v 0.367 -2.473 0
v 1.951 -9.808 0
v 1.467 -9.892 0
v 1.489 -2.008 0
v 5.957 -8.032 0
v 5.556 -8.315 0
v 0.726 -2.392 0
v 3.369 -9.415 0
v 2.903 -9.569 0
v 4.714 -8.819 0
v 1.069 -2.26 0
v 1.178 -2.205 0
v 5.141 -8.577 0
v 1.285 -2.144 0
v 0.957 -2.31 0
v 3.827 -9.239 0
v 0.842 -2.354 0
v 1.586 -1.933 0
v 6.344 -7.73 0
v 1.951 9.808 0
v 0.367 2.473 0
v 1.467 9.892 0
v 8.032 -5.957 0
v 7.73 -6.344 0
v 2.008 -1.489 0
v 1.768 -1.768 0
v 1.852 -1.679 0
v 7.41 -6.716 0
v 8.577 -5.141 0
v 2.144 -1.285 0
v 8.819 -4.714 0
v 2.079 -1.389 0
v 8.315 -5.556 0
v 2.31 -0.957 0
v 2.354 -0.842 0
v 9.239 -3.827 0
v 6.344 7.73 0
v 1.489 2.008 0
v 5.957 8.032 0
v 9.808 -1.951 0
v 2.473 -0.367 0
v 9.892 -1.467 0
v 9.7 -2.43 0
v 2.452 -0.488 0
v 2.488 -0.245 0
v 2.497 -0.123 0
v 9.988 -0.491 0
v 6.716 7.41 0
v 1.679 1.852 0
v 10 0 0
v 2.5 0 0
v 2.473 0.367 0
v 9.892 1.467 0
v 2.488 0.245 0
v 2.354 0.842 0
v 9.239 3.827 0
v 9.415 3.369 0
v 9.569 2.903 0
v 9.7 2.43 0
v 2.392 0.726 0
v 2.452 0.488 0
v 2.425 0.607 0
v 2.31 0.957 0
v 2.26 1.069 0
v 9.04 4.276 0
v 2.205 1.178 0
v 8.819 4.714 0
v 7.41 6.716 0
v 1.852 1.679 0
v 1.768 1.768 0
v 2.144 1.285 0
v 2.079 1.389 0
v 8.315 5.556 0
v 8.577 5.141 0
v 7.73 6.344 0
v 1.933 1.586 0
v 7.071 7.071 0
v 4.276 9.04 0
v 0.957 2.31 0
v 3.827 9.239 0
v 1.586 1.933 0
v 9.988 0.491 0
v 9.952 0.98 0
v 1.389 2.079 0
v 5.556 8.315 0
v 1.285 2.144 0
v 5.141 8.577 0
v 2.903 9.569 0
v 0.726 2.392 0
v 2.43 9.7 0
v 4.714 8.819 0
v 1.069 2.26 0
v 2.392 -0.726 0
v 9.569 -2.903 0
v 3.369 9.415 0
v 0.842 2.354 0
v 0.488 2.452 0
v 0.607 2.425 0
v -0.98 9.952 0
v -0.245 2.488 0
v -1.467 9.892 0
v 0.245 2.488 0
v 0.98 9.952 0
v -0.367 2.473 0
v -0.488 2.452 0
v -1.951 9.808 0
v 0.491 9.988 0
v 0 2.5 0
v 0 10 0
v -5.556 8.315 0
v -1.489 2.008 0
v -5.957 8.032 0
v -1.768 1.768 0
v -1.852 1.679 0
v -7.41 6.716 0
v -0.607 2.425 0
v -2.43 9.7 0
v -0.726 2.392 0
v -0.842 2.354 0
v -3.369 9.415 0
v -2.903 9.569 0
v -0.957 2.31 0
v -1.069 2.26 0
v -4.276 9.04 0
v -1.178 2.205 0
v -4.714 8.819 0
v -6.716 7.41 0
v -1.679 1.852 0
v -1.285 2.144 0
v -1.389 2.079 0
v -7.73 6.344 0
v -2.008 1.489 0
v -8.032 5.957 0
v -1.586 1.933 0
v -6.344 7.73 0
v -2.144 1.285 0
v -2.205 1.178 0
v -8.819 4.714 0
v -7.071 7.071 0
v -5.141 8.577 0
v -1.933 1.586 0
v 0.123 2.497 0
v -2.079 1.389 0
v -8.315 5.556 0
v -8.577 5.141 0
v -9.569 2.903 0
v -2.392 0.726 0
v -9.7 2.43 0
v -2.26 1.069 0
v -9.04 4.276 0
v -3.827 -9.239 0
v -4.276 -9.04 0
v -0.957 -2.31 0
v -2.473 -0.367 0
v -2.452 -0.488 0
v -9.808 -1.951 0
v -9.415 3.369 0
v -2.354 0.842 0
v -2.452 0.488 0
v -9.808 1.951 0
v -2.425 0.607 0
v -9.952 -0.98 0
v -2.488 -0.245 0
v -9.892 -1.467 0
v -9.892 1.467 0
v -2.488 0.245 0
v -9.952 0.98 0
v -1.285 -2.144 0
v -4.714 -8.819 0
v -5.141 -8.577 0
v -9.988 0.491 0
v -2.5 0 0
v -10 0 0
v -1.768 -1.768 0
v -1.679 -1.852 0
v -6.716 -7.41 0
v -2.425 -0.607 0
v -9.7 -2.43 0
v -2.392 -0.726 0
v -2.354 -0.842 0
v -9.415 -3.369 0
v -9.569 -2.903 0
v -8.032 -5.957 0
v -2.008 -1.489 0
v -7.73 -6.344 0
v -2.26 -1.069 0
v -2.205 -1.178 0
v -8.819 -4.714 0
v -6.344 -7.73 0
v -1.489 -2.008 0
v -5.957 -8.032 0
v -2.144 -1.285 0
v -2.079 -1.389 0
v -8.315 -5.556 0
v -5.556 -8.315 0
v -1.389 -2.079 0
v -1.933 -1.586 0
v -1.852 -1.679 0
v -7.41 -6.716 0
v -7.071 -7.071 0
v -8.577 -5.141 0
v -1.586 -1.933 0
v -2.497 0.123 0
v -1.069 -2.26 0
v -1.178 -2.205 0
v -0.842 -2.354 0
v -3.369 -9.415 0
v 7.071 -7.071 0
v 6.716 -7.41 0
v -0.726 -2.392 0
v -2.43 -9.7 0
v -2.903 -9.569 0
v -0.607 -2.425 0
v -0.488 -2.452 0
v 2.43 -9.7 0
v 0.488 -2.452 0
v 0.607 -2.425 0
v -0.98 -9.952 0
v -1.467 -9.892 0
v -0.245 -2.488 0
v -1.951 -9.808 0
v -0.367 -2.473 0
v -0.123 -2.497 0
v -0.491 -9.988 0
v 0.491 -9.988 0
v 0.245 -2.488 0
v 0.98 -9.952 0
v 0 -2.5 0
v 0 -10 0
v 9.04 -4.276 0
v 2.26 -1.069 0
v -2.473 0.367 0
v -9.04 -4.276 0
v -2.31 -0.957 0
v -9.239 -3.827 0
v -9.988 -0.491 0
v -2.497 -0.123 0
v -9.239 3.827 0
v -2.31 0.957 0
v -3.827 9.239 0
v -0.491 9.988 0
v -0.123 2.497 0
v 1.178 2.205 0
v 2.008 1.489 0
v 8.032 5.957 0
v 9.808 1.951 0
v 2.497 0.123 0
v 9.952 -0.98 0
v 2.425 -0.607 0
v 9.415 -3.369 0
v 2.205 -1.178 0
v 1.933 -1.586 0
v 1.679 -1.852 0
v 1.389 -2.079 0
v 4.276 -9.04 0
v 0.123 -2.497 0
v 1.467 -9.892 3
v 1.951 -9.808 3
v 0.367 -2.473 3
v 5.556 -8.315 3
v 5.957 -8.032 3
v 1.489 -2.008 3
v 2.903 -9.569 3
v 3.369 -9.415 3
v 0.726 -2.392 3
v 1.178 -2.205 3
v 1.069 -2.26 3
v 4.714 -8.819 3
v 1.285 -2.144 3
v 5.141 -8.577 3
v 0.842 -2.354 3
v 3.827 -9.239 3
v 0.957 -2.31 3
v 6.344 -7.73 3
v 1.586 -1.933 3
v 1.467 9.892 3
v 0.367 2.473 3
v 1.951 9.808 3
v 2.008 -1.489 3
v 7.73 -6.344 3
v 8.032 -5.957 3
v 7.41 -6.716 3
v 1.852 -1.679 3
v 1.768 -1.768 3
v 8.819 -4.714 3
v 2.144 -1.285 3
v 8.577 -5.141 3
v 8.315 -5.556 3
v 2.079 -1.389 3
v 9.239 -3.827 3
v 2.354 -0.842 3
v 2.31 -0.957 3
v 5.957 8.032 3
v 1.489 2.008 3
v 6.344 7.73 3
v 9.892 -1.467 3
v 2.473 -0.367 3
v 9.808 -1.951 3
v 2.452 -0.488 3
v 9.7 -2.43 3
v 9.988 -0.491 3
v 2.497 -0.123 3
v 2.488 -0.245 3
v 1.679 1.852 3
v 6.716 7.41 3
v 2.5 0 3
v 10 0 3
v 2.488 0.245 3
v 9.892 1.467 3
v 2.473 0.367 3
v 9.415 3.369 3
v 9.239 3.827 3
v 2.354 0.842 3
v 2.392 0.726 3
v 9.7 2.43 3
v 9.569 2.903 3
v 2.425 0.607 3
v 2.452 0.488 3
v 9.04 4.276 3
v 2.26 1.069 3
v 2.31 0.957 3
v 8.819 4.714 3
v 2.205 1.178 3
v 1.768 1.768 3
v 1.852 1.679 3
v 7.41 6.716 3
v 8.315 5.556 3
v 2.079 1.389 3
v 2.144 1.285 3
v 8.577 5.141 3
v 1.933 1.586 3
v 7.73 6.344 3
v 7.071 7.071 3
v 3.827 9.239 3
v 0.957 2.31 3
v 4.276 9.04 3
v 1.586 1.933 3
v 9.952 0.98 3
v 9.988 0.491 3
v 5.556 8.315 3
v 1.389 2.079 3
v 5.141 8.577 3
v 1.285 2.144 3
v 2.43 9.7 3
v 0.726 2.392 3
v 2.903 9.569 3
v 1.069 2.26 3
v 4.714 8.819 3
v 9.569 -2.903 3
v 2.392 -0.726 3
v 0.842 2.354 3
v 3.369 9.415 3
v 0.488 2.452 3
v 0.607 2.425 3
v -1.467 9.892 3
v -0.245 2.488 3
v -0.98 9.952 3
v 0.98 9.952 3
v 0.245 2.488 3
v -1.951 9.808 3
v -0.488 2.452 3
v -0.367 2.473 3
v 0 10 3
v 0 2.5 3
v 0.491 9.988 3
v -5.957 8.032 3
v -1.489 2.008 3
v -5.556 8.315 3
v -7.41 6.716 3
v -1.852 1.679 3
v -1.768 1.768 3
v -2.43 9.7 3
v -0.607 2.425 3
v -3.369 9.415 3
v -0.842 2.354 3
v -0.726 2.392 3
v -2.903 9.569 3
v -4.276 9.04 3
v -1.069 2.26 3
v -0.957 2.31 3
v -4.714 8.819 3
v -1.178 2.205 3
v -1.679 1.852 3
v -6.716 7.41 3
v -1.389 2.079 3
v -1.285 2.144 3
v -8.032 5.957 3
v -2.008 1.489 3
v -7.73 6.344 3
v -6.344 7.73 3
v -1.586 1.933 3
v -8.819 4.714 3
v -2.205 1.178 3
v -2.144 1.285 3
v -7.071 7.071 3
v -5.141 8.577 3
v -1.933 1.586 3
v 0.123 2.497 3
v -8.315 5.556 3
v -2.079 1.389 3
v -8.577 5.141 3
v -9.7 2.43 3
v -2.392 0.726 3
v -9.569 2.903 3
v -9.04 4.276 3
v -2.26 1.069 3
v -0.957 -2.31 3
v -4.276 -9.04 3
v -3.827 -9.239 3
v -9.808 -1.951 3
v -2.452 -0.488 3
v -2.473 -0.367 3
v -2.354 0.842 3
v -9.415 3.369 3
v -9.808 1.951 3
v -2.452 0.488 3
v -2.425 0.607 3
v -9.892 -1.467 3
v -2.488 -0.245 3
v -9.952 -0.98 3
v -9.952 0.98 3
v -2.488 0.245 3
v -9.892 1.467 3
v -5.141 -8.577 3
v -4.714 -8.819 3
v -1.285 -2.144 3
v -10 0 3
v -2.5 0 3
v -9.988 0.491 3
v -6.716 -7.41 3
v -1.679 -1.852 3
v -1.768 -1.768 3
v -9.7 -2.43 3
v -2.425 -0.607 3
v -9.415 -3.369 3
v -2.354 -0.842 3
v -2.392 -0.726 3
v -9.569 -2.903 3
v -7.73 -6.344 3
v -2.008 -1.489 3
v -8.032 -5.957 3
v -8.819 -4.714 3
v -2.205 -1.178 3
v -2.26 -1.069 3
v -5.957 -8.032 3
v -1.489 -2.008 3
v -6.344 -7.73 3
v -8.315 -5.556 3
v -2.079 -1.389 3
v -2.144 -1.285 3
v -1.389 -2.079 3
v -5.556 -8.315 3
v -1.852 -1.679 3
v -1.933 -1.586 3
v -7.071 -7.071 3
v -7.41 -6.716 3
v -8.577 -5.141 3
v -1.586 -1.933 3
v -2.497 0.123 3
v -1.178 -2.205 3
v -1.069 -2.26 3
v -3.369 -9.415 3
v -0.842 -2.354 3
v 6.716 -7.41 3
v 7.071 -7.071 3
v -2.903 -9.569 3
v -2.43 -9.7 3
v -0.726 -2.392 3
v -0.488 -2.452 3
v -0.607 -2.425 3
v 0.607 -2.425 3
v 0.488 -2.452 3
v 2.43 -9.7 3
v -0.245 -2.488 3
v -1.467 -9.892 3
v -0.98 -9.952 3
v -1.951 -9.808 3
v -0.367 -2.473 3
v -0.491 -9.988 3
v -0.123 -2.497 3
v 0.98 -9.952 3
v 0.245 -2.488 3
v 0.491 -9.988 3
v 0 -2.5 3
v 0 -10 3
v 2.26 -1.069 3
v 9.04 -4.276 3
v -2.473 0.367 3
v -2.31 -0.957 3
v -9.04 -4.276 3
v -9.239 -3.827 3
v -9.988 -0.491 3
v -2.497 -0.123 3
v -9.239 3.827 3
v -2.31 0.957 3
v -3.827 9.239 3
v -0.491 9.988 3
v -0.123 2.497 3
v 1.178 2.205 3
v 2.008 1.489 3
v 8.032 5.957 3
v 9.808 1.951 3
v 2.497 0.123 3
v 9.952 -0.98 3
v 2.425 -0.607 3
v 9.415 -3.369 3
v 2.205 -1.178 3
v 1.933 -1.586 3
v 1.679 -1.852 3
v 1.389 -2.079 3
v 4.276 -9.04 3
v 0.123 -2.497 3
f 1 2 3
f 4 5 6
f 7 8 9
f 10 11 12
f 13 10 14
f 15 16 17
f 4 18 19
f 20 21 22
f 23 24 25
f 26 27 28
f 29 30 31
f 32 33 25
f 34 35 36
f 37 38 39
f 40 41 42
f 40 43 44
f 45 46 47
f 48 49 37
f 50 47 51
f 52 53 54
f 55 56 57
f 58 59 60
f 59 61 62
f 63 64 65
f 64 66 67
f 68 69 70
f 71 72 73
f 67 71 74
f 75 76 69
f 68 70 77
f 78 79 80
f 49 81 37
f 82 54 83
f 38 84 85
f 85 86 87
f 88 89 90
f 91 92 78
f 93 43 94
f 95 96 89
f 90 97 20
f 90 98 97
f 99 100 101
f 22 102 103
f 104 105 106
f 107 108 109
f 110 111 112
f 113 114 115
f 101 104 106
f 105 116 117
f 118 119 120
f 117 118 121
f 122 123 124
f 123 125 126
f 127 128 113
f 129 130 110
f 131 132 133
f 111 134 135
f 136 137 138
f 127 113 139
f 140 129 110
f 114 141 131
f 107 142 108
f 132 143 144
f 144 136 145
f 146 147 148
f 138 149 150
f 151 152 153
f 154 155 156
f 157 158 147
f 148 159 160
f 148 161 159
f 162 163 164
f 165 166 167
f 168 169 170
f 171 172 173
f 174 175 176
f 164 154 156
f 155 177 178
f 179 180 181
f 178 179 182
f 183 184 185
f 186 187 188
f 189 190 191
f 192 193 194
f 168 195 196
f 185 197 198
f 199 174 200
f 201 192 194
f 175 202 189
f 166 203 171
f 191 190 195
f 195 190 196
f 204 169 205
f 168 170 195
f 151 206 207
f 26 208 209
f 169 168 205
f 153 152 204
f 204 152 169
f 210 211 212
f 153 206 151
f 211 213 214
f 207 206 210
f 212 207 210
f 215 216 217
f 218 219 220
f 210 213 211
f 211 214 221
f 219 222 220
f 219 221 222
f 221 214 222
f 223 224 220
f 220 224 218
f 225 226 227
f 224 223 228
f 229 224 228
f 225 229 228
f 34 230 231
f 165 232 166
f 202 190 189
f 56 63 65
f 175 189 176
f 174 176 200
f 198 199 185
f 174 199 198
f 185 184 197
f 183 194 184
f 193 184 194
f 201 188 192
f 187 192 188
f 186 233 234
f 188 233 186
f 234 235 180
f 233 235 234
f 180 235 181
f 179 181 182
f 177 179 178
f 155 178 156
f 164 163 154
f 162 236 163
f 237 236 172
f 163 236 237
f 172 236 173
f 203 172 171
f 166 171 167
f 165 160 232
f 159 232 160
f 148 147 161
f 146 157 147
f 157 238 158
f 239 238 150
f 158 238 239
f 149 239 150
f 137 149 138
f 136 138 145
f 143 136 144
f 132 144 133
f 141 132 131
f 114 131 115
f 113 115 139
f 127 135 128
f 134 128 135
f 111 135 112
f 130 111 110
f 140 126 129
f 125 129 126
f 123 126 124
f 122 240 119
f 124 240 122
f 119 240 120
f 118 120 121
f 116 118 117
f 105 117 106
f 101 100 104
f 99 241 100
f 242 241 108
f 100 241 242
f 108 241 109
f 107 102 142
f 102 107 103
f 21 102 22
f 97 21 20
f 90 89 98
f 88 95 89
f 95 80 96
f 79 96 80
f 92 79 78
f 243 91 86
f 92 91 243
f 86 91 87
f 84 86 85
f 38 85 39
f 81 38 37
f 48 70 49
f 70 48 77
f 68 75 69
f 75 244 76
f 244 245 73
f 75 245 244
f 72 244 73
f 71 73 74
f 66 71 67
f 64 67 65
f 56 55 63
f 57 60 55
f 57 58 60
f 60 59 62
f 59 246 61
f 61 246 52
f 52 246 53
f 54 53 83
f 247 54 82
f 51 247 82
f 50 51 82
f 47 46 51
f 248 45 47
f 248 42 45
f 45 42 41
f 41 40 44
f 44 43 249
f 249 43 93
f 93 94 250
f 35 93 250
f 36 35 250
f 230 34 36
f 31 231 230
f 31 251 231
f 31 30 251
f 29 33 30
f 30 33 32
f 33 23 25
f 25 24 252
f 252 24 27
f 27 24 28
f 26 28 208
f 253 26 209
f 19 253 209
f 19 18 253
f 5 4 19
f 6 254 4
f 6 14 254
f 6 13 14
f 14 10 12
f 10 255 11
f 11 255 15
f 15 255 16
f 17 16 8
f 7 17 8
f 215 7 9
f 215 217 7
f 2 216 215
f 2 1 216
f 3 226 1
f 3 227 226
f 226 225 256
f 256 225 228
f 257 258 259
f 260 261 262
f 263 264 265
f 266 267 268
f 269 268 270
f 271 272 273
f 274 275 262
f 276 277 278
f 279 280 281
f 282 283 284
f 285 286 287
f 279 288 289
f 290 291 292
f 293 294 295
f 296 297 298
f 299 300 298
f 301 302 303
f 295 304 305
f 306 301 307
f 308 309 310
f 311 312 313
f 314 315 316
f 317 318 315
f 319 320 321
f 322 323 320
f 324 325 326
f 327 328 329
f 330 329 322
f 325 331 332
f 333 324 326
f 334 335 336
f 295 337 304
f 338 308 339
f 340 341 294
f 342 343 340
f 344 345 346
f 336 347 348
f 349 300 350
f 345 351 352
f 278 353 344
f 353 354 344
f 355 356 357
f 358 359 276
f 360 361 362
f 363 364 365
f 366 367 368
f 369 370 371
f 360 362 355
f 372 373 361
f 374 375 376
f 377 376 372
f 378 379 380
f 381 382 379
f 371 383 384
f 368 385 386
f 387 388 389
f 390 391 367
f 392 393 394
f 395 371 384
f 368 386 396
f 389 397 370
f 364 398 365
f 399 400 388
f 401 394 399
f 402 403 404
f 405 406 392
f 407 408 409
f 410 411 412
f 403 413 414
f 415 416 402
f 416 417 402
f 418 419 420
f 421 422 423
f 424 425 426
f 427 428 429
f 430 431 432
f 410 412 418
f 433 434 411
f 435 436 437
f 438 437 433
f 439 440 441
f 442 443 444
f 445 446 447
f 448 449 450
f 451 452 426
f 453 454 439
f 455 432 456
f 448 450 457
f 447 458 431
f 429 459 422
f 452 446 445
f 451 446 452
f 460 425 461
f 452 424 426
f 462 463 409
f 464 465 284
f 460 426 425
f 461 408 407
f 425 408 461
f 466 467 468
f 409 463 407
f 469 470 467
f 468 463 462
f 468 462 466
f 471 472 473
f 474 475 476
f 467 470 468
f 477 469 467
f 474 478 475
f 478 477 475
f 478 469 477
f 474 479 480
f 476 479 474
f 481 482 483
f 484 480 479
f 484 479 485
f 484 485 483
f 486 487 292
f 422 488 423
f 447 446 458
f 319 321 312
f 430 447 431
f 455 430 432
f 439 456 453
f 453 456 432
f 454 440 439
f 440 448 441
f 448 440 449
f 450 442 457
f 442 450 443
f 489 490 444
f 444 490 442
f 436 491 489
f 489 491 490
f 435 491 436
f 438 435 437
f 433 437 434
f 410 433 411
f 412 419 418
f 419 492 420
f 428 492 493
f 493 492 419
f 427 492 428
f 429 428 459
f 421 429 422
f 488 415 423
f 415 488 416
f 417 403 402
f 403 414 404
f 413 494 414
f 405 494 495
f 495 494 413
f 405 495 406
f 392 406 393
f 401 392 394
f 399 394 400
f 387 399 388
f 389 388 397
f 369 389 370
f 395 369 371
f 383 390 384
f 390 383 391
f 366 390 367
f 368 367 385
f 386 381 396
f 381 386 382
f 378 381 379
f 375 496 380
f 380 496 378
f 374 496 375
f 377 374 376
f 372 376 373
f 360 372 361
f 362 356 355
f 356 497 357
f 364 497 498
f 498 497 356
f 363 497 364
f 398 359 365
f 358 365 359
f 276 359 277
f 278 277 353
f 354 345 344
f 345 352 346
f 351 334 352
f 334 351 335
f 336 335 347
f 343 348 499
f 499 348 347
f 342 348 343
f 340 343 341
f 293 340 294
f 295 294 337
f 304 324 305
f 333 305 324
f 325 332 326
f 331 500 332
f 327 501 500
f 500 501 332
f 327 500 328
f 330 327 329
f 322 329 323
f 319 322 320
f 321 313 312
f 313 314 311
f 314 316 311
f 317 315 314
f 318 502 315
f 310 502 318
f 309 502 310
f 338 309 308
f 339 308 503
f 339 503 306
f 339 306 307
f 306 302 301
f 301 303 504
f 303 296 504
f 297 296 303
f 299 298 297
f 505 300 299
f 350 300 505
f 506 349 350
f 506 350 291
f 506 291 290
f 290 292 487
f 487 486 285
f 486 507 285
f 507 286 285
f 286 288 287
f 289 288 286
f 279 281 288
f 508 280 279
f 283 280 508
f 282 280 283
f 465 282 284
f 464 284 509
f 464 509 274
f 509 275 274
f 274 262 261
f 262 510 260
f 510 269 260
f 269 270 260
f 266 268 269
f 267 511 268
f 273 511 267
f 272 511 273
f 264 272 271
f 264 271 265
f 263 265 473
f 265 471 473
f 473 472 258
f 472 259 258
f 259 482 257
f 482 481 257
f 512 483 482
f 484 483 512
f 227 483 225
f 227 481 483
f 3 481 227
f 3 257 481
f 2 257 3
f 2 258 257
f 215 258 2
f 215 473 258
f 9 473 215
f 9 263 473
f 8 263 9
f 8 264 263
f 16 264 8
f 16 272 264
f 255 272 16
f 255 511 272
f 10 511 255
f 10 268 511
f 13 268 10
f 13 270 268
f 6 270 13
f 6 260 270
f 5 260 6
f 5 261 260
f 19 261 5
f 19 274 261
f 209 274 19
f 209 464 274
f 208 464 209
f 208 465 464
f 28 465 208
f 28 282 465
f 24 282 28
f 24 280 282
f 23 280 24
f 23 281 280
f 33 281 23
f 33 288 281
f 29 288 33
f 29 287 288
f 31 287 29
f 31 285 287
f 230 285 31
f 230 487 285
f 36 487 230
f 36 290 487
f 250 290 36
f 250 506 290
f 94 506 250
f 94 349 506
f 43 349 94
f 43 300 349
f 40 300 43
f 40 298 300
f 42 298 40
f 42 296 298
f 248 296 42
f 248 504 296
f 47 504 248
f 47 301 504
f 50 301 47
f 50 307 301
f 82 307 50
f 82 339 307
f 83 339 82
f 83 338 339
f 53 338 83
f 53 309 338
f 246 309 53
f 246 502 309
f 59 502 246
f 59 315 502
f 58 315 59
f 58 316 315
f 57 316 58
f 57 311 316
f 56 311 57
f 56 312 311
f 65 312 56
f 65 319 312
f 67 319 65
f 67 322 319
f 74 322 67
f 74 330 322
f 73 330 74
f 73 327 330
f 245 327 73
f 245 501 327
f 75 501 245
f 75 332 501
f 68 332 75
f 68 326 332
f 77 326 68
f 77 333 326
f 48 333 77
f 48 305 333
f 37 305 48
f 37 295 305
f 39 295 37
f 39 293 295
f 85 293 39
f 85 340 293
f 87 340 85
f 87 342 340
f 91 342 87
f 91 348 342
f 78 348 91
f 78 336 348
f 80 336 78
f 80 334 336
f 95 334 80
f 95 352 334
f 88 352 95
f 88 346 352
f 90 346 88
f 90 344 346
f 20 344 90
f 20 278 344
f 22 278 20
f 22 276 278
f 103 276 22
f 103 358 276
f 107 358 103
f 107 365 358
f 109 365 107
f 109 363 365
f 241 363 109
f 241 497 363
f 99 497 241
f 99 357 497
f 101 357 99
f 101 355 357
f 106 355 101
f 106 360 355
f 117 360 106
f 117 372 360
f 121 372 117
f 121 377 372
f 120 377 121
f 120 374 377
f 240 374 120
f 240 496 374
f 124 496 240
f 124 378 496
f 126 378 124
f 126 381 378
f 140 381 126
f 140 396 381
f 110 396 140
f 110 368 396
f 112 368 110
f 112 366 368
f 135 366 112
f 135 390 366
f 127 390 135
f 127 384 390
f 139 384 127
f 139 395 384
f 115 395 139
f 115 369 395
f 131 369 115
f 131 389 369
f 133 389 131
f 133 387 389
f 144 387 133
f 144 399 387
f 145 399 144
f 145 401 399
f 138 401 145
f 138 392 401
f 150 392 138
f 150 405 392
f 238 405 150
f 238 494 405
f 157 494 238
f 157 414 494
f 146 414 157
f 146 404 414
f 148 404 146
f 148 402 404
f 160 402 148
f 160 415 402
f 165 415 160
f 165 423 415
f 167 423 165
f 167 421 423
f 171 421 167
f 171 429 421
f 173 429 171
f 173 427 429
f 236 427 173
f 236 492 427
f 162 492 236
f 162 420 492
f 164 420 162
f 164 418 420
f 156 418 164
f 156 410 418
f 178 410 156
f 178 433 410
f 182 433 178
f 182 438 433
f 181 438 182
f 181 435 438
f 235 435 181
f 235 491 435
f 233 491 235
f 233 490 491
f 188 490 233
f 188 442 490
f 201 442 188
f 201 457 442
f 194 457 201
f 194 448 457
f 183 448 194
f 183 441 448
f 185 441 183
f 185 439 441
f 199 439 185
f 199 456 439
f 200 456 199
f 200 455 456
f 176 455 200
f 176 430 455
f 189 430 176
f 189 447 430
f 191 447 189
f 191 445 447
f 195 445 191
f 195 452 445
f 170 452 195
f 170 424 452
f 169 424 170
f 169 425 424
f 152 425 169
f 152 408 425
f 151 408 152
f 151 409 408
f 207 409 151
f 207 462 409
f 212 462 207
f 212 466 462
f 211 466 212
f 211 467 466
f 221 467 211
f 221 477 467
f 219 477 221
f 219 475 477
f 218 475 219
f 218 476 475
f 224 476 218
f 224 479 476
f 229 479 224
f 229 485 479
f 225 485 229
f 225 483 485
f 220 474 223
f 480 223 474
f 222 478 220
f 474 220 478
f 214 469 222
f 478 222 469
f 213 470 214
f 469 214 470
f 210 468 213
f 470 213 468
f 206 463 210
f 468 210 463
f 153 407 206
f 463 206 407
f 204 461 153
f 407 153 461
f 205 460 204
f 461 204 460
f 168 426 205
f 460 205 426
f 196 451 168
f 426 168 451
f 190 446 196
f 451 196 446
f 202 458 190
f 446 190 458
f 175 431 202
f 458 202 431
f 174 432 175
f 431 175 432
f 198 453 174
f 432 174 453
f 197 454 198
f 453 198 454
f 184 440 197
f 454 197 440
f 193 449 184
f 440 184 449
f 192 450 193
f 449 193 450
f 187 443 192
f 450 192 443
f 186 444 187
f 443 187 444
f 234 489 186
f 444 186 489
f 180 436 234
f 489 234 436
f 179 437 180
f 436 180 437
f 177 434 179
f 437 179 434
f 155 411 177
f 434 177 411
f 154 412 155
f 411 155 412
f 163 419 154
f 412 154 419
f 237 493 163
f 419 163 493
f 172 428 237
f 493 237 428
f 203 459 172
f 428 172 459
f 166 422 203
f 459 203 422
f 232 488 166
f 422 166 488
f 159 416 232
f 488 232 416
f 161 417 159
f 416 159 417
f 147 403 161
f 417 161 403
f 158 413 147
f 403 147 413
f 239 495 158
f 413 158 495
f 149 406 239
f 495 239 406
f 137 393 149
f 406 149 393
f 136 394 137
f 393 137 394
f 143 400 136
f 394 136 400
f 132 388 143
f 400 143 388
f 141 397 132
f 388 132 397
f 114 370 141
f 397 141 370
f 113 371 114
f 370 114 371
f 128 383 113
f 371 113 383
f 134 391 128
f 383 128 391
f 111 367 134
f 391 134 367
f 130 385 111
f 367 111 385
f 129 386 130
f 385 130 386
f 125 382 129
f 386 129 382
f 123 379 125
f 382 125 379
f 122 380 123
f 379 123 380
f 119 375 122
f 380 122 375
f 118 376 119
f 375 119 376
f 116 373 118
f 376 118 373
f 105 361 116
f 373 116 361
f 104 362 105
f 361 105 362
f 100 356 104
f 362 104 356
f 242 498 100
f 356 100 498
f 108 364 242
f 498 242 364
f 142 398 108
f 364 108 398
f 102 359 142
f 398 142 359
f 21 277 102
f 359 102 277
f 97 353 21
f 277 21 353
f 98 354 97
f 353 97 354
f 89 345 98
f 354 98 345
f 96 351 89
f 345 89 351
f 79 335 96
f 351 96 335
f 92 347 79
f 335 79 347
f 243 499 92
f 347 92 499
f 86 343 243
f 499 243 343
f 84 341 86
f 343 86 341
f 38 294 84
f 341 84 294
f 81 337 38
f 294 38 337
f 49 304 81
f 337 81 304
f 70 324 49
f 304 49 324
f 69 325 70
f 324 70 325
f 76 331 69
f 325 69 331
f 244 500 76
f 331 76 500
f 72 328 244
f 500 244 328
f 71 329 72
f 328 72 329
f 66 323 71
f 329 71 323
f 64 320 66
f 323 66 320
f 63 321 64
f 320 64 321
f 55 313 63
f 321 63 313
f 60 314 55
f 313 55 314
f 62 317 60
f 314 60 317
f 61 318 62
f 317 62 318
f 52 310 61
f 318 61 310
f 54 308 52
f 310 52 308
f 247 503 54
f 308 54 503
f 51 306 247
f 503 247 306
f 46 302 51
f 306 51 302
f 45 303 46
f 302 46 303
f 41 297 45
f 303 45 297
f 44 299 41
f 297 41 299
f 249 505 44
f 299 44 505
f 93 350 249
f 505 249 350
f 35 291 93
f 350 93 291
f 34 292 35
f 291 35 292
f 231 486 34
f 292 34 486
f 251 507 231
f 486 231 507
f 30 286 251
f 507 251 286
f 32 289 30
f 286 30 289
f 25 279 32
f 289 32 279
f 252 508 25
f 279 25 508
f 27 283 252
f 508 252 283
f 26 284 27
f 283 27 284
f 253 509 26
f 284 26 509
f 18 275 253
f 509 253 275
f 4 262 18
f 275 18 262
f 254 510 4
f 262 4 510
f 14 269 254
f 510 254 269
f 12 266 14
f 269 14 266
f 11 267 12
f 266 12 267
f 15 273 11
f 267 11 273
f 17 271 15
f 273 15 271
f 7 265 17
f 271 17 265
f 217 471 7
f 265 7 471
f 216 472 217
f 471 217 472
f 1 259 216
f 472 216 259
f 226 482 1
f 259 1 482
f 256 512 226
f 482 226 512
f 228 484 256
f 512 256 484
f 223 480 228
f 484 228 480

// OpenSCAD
/****************************************************
 Parametric Washer / Spacer (MakerWorld / OpenSCAD)
****************************************************/

/* [Parametric Washer (in mm)] */

Shape = 0; // [0:Circle, 1:Triangle, 2:Square, 3:Polygon]

// Outer Diameter > Inner Diameter
Outer_Diameter = 20; // [1:0.1:200]
Inner_Diameter = 5;  // [0:0.1:199]
Height = 3; // [0.2:0.1:50]

// Used only when Shape=Polygon
Polygon_Sides = 6; // [3:1:20]

/* [Quality] */
$fn = 128; // [16:1:256]


// ---------- Helpers ----------
module regular_ngon(n, r) {
    polygon(points=[
        for (i = [0:n-1])
            [r*cos(360*i/n), r*sin(360*i/n)]
    ]);
}

module outer_profile(shape, od, n) {
    if (shape == 0) {
        circle(d = od);
    } else if (shape == 1) {
        regular_ngon(3, od/2);
    } else if (shape == 2) {
        // square whose diagonal = od
        square([od / sqrt(2), od / sqrt(2)], center = true);
    } else {
        regular_ngon(max(3, n), od/2);
    }
}

module washer(shape, od, id, h, n) {
    assert(od > id, "Outer_Diameter must be > Inner_Diameter");
    linear_extrude(height = h)
        difference() {
            outer_profile(shape, od, n);
            if (id > 0) circle(d = id);
        }
}

// ---------- Build ----------
washer(Shape, Outer_Diameter, Inner_Diameter, Height, Polygon_Sides);
